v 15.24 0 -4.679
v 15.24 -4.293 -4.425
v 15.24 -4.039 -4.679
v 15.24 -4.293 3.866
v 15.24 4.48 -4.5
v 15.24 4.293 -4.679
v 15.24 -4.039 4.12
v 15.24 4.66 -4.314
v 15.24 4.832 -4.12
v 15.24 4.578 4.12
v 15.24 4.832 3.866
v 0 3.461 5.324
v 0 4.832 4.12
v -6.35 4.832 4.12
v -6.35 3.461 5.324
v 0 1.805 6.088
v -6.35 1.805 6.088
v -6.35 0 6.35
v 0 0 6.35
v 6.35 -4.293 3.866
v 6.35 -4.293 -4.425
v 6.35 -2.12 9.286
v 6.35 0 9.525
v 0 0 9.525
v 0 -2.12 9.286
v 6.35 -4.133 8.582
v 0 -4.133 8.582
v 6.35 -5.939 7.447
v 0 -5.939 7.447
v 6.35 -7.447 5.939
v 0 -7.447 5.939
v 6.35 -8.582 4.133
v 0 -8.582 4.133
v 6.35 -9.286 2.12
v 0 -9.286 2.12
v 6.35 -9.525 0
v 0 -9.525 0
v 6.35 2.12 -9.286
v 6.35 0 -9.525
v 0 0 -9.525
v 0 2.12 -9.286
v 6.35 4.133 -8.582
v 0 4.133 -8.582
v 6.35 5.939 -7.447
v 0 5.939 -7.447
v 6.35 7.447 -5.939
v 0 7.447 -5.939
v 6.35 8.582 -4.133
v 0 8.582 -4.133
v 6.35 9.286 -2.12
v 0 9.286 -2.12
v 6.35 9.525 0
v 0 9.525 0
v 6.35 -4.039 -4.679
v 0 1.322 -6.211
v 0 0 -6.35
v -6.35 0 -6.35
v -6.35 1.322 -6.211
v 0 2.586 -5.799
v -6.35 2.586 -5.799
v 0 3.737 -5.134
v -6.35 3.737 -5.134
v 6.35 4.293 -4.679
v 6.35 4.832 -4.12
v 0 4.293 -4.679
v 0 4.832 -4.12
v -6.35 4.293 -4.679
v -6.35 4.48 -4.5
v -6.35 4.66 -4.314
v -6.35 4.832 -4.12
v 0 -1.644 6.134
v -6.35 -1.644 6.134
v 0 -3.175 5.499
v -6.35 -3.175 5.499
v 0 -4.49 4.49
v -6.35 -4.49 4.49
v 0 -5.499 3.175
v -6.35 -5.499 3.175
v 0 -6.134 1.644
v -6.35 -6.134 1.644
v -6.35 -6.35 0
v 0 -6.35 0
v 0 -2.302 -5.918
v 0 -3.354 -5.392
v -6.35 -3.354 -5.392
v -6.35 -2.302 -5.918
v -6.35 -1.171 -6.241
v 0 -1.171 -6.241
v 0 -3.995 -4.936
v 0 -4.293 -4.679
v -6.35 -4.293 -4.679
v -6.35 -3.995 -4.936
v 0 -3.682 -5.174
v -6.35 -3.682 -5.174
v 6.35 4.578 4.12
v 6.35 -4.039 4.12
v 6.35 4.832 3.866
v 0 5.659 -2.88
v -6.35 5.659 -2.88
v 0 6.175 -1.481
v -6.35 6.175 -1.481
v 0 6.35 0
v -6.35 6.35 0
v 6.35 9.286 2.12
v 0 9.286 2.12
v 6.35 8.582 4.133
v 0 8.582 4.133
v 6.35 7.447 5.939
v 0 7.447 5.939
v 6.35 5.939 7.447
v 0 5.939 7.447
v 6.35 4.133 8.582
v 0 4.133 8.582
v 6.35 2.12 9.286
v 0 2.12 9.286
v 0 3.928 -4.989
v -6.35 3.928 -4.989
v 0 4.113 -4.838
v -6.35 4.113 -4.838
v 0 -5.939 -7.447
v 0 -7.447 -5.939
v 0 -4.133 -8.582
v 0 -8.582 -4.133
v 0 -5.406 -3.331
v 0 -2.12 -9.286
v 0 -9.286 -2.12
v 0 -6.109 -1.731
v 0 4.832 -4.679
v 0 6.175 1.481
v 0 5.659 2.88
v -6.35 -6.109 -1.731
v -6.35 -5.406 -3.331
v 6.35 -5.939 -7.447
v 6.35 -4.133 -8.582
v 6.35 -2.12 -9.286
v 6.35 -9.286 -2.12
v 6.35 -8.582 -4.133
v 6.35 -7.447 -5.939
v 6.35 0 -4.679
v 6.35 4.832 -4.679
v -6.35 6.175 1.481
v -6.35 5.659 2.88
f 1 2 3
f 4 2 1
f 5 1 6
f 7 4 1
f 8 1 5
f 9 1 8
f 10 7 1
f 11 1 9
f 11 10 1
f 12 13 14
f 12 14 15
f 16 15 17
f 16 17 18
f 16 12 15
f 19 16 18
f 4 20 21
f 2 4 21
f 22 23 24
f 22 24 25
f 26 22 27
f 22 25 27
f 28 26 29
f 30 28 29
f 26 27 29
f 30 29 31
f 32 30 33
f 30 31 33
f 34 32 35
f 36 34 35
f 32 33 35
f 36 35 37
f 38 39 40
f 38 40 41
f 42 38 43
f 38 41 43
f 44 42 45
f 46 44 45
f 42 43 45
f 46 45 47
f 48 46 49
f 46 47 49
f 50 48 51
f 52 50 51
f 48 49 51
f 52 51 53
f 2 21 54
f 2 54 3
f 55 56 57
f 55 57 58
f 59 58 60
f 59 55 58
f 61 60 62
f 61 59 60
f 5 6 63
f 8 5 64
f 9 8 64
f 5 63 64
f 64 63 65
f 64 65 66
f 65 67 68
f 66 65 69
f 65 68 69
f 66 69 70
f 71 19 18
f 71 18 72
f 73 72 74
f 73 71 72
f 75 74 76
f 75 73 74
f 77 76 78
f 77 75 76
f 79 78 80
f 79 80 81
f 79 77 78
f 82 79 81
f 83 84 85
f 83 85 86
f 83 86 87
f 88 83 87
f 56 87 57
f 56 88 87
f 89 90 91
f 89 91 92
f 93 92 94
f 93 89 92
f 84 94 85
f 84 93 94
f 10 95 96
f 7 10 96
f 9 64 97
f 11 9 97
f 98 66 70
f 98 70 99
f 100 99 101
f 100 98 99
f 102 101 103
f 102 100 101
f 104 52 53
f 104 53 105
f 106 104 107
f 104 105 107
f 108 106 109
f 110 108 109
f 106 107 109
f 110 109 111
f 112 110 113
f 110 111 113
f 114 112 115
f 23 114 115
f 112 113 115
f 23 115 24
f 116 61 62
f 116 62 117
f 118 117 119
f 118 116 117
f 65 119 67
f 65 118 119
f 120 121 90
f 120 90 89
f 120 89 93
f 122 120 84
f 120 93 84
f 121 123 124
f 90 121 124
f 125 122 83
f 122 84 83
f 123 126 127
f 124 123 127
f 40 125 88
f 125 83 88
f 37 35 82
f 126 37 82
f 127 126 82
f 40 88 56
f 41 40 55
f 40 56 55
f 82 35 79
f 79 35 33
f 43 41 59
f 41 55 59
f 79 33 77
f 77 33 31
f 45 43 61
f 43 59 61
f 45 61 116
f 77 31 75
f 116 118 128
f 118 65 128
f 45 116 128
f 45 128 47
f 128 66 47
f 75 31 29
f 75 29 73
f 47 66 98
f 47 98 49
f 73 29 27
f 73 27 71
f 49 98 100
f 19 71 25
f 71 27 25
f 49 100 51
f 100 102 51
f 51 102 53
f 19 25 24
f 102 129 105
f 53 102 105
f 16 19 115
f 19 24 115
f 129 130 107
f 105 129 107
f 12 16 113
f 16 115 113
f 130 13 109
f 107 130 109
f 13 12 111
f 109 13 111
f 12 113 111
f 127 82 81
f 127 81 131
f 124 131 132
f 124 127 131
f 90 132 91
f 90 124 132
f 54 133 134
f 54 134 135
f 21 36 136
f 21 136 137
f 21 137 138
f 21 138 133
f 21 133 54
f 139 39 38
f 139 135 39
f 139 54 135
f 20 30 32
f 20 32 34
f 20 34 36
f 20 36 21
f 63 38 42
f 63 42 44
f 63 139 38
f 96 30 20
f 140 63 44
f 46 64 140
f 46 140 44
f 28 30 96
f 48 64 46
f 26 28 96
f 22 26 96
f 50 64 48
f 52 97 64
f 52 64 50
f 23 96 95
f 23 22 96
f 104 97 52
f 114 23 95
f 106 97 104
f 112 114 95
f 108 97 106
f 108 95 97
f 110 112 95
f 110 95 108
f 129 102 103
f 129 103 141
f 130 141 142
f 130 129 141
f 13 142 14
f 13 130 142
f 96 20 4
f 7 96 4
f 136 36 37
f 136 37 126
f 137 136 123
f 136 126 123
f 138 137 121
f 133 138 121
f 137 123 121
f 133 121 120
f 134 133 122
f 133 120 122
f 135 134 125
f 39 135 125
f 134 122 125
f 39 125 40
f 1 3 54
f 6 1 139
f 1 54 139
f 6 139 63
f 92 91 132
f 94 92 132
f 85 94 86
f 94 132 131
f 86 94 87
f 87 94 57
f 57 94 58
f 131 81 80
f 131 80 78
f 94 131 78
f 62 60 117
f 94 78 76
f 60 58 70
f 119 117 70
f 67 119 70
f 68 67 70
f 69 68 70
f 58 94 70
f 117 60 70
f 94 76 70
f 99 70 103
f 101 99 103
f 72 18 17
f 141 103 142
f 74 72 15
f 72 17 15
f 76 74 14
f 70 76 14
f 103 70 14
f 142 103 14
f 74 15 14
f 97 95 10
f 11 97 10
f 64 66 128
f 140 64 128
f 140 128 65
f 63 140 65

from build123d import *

# Parameters (mm, degrees)
F0_W          = 4.8315766917
F0_H          = 4.1204813641
F0_W_2        = 4.2928811043
F0_H_2        = 4.6790674097
F1_DEPTH      = 6.35
F1_DEPTH_BACK = 6.35
F2_DEPTH      = 6.35
F3_START      = 6.35
F3_DEPTH      = 8.89
F4_SIZE       = 0.254


# Not quite as in the source:
# - a feature names something its author has since deleted; it is built from what else it names


with BuildPart() as f1:
    # F0 (on Right) → F1 (new body, two sides)
    with BuildSketch(Plane.YZ) as f1_sk:
        with BuildLine():
            Line((0, -4.6790674097), (0, -6.35))
            ThreePointArc((0, -6.35), (1.9649498234, -6.0383335608), (3.7370149493, -5.1339282493))
            ThreePointArc((3.7370149493, -5.1339282493), (4.0213843703, -4.9143634121), (4.2928811043, -4.6790674097))
            Line((4.2928811043, -4.6790674097), (0, -4.6790674097))
        make_face()
        with BuildLine():
            Line((4.8315766917, -4.1204813641), (4.8315766917, 0))
            Line((4.8315766917, 0), (0, 0))
            Line((0, 0), (0, -4.6790674097))
            Line((0, -4.6790674097), (4.2928811043, -4.6790674097))
            ThreePointArc((4.2928811043, -4.6790674097), (4.5707698597, -4.4080112171), (4.8315766917, -4.1204813641))
        make_face()
        with Locations((2.4157883458, 2.0602406821)):
            Rectangle(F0_W, F0_H)
        with Locations((-2.1464405521, 2.0602406821)):
            Rectangle(F0_W_2, F0_H)
        with Locations((-2.1464405521, -2.3395337049)):
            Rectangle(F0_W_2, F0_H_2)
        with BuildLine():
            Line((-4.2928811043, 0), (-6.35, 0))
            ThreePointArc((-6.35, 0), (-5.813015354, -2.55565109), (-4.2928811043, -4.6790674097))
            Line((-4.2928811043, -4.6790674097), (-4.2928811043, 0))
        make_face()
        with BuildLine():
            ThreePointArc((-3.3540888173, -5.3919002407), (-1.7441234864, -6.105778678), (0, -6.35))
            Line((0, -6.35), (0, -4.6790674097))
            Line((0, -4.6790674097), (-4.2928811043, -4.6790674097))
            ThreePointArc((-4.2928811043, -4.6790674097), (-3.8400611852, -5.057314514), (-3.3540888173, -5.3919002407))
        make_face()
        with BuildLine():
            Line((4.8315766917, 0), (6.35, 0))
            ThreePointArc((6.35, 0), (5.958314023, 2.1956762065), (4.8315766917, 4.1204813641))
            Line((4.8315766917, 4.1204813641), (4.8315766917, 0))
        make_face()
        with BuildLine():
            ThreePointArc((4.8315766917, -4.1204813641), (5.958314023, -2.1956762065), (6.35, 0))
            Line((6.35, 0), (4.8315766917, 0))
            Line((4.8315766917, 0), (4.8315766917, -4.1204813641))
        make_face()
        with BuildLine():
            ThreePointArc((4.8315766917, 4.1204813641), (2.6605867151, 5.765741785), (0, 6.35))
            Line((0, 6.35), (0, 4.1204813641))
            Line((0, 4.1204813641), (4.8315766917, 4.1204813641))
        make_face()
        with BuildLine():
            Line((0, 4.1204813641), (0, 6.35))
            ThreePointArc((0, 6.35), (-4.4901280605, 4.4901280605), (-6.35, 0))
            Line((-6.35, 0), (-4.2928811043, 0))
            Line((-4.2928811043, 0), (-4.2928811043, 4.1204813641))
            Line((-4.2928811043, 4.1204813641), (0, 4.1204813641))
        make_face()
    extrude(amount=F1_DEPTH)
    extrude(f1_sk.sketch, amount=-F1_DEPTH_BACK)

    # F0 (on Right) → F2 (join)
    with BuildSketch(Plane.YZ):
        with BuildLine():
            ThreePointArc((0, -9.525), (6.7351920908, -6.7351920908), (9.525, 0))
            Line((9.525, 0), (6.35, 0))
            ThreePointArc((6.35, 0), (5.958314023, -2.1956762065), (4.8315766917, -4.1204813641))
            Line((4.8315766917, -4.1204813641), (4.8315766917, -4.6790674097))
            Line((4.8315766917, -4.6790674097), (4.2928811043, -4.6790674097))
            ThreePointArc((4.2928811043, -4.6790674097), (4.0213843703, -4.9143634121), (3.7370149493, -5.1339282493))
            ThreePointArc((3.7370149493, -5.1339282493), (1.9649498234, -6.0383335608), (0, -6.35))
            Line((0, -6.35), (0, -9.525))
        make_face()
        with BuildLine():
            Line((6.35, 0), (9.525, 0))
            ThreePointArc((9.525, 0), (6.7351920908, 6.7351920908), (0, 9.525))
            Line((0, 9.525), (0, 6.35))
            ThreePointArc((0, 6.35), (2.6605867151, 5.765741785), (4.8315766917, 4.1204813641))
            ThreePointArc((4.8315766917, 4.1204813641), (5.958314023, 2.1956762065), (6.35, 0))
        make_face()
        with BuildLine():
            Line((0, 6.35), (0, 9.525))
            ThreePointArc((0, 9.525), (-6.7351920908, 6.7351920908), (-9.525, 0))
            Line((-9.525, 0), (-6.35, 0))
            ThreePointArc((-6.35, 0), (-4.4901280605, 4.4901280605), (0, 6.35))
        make_face()
        with BuildLine():
            ThreePointArc((-9.525, 0), (-6.7351920908, -6.7351920908), (0, -9.525))
            Line((0, -9.525), (0, -6.35))
            ThreePointArc((0, -6.35), (-1.7441234864, -6.105778678), (-3.3540888173, -5.3919002407))
            ThreePointArc((-3.3540888173, -5.3919002407), (-3.8400611852, -5.057314514), (-4.2928811043, -4.6790674097))
            ThreePointArc((-4.2928811043, -4.6790674097), (-5.813015354, -2.55565109), (-6.35, 0))
            Line((-6.35, 0), (-9.525, 0))
        make_face()
    extrude(amount=F2_DEPTH)

    # F0 (on Right) → F3 (join)
    with BuildSketch(Plane.YZ.offset(F3_START)):
        with BuildLine():
            Line((4.8315766917, -4.1204813641), (4.8315766917, 0))
            Line((4.8315766917, 0), (0, 0))
            Line((0, 0), (0, -4.6790674097))
            Line((0, -4.6790674097), (4.2928811043, -4.6790674097))
            ThreePointArc((4.2928811043, -4.6790674097), (4.5707698597, -4.4080112171), (4.8315766917, -4.1204813641))
        make_face()
        with Locations((2.4157883458, 2.0602406821)):
            Rectangle(F0_W, F0_H)
        with Locations((-2.1464405521, 2.0602406821)):
            Rectangle(F0_W_2, F0_H)
        with Locations((-2.1464405521, -2.3395337049)):
            Rectangle(F0_W_2, F0_H_2)
    extrude(amount=F3_DEPTH)

    # F4
    f4_edges = [f1.edges().sort_by_distance(p)[0] for p in [
        (10.795, -4.292881, 4.120481),
        (10.795, -4.292881, -4.679067),
        (10.795, 4.831577, 4.120481),
    ]]
    chamfer(f4_edges, length=F4_SIZE)


solid = f1.part
